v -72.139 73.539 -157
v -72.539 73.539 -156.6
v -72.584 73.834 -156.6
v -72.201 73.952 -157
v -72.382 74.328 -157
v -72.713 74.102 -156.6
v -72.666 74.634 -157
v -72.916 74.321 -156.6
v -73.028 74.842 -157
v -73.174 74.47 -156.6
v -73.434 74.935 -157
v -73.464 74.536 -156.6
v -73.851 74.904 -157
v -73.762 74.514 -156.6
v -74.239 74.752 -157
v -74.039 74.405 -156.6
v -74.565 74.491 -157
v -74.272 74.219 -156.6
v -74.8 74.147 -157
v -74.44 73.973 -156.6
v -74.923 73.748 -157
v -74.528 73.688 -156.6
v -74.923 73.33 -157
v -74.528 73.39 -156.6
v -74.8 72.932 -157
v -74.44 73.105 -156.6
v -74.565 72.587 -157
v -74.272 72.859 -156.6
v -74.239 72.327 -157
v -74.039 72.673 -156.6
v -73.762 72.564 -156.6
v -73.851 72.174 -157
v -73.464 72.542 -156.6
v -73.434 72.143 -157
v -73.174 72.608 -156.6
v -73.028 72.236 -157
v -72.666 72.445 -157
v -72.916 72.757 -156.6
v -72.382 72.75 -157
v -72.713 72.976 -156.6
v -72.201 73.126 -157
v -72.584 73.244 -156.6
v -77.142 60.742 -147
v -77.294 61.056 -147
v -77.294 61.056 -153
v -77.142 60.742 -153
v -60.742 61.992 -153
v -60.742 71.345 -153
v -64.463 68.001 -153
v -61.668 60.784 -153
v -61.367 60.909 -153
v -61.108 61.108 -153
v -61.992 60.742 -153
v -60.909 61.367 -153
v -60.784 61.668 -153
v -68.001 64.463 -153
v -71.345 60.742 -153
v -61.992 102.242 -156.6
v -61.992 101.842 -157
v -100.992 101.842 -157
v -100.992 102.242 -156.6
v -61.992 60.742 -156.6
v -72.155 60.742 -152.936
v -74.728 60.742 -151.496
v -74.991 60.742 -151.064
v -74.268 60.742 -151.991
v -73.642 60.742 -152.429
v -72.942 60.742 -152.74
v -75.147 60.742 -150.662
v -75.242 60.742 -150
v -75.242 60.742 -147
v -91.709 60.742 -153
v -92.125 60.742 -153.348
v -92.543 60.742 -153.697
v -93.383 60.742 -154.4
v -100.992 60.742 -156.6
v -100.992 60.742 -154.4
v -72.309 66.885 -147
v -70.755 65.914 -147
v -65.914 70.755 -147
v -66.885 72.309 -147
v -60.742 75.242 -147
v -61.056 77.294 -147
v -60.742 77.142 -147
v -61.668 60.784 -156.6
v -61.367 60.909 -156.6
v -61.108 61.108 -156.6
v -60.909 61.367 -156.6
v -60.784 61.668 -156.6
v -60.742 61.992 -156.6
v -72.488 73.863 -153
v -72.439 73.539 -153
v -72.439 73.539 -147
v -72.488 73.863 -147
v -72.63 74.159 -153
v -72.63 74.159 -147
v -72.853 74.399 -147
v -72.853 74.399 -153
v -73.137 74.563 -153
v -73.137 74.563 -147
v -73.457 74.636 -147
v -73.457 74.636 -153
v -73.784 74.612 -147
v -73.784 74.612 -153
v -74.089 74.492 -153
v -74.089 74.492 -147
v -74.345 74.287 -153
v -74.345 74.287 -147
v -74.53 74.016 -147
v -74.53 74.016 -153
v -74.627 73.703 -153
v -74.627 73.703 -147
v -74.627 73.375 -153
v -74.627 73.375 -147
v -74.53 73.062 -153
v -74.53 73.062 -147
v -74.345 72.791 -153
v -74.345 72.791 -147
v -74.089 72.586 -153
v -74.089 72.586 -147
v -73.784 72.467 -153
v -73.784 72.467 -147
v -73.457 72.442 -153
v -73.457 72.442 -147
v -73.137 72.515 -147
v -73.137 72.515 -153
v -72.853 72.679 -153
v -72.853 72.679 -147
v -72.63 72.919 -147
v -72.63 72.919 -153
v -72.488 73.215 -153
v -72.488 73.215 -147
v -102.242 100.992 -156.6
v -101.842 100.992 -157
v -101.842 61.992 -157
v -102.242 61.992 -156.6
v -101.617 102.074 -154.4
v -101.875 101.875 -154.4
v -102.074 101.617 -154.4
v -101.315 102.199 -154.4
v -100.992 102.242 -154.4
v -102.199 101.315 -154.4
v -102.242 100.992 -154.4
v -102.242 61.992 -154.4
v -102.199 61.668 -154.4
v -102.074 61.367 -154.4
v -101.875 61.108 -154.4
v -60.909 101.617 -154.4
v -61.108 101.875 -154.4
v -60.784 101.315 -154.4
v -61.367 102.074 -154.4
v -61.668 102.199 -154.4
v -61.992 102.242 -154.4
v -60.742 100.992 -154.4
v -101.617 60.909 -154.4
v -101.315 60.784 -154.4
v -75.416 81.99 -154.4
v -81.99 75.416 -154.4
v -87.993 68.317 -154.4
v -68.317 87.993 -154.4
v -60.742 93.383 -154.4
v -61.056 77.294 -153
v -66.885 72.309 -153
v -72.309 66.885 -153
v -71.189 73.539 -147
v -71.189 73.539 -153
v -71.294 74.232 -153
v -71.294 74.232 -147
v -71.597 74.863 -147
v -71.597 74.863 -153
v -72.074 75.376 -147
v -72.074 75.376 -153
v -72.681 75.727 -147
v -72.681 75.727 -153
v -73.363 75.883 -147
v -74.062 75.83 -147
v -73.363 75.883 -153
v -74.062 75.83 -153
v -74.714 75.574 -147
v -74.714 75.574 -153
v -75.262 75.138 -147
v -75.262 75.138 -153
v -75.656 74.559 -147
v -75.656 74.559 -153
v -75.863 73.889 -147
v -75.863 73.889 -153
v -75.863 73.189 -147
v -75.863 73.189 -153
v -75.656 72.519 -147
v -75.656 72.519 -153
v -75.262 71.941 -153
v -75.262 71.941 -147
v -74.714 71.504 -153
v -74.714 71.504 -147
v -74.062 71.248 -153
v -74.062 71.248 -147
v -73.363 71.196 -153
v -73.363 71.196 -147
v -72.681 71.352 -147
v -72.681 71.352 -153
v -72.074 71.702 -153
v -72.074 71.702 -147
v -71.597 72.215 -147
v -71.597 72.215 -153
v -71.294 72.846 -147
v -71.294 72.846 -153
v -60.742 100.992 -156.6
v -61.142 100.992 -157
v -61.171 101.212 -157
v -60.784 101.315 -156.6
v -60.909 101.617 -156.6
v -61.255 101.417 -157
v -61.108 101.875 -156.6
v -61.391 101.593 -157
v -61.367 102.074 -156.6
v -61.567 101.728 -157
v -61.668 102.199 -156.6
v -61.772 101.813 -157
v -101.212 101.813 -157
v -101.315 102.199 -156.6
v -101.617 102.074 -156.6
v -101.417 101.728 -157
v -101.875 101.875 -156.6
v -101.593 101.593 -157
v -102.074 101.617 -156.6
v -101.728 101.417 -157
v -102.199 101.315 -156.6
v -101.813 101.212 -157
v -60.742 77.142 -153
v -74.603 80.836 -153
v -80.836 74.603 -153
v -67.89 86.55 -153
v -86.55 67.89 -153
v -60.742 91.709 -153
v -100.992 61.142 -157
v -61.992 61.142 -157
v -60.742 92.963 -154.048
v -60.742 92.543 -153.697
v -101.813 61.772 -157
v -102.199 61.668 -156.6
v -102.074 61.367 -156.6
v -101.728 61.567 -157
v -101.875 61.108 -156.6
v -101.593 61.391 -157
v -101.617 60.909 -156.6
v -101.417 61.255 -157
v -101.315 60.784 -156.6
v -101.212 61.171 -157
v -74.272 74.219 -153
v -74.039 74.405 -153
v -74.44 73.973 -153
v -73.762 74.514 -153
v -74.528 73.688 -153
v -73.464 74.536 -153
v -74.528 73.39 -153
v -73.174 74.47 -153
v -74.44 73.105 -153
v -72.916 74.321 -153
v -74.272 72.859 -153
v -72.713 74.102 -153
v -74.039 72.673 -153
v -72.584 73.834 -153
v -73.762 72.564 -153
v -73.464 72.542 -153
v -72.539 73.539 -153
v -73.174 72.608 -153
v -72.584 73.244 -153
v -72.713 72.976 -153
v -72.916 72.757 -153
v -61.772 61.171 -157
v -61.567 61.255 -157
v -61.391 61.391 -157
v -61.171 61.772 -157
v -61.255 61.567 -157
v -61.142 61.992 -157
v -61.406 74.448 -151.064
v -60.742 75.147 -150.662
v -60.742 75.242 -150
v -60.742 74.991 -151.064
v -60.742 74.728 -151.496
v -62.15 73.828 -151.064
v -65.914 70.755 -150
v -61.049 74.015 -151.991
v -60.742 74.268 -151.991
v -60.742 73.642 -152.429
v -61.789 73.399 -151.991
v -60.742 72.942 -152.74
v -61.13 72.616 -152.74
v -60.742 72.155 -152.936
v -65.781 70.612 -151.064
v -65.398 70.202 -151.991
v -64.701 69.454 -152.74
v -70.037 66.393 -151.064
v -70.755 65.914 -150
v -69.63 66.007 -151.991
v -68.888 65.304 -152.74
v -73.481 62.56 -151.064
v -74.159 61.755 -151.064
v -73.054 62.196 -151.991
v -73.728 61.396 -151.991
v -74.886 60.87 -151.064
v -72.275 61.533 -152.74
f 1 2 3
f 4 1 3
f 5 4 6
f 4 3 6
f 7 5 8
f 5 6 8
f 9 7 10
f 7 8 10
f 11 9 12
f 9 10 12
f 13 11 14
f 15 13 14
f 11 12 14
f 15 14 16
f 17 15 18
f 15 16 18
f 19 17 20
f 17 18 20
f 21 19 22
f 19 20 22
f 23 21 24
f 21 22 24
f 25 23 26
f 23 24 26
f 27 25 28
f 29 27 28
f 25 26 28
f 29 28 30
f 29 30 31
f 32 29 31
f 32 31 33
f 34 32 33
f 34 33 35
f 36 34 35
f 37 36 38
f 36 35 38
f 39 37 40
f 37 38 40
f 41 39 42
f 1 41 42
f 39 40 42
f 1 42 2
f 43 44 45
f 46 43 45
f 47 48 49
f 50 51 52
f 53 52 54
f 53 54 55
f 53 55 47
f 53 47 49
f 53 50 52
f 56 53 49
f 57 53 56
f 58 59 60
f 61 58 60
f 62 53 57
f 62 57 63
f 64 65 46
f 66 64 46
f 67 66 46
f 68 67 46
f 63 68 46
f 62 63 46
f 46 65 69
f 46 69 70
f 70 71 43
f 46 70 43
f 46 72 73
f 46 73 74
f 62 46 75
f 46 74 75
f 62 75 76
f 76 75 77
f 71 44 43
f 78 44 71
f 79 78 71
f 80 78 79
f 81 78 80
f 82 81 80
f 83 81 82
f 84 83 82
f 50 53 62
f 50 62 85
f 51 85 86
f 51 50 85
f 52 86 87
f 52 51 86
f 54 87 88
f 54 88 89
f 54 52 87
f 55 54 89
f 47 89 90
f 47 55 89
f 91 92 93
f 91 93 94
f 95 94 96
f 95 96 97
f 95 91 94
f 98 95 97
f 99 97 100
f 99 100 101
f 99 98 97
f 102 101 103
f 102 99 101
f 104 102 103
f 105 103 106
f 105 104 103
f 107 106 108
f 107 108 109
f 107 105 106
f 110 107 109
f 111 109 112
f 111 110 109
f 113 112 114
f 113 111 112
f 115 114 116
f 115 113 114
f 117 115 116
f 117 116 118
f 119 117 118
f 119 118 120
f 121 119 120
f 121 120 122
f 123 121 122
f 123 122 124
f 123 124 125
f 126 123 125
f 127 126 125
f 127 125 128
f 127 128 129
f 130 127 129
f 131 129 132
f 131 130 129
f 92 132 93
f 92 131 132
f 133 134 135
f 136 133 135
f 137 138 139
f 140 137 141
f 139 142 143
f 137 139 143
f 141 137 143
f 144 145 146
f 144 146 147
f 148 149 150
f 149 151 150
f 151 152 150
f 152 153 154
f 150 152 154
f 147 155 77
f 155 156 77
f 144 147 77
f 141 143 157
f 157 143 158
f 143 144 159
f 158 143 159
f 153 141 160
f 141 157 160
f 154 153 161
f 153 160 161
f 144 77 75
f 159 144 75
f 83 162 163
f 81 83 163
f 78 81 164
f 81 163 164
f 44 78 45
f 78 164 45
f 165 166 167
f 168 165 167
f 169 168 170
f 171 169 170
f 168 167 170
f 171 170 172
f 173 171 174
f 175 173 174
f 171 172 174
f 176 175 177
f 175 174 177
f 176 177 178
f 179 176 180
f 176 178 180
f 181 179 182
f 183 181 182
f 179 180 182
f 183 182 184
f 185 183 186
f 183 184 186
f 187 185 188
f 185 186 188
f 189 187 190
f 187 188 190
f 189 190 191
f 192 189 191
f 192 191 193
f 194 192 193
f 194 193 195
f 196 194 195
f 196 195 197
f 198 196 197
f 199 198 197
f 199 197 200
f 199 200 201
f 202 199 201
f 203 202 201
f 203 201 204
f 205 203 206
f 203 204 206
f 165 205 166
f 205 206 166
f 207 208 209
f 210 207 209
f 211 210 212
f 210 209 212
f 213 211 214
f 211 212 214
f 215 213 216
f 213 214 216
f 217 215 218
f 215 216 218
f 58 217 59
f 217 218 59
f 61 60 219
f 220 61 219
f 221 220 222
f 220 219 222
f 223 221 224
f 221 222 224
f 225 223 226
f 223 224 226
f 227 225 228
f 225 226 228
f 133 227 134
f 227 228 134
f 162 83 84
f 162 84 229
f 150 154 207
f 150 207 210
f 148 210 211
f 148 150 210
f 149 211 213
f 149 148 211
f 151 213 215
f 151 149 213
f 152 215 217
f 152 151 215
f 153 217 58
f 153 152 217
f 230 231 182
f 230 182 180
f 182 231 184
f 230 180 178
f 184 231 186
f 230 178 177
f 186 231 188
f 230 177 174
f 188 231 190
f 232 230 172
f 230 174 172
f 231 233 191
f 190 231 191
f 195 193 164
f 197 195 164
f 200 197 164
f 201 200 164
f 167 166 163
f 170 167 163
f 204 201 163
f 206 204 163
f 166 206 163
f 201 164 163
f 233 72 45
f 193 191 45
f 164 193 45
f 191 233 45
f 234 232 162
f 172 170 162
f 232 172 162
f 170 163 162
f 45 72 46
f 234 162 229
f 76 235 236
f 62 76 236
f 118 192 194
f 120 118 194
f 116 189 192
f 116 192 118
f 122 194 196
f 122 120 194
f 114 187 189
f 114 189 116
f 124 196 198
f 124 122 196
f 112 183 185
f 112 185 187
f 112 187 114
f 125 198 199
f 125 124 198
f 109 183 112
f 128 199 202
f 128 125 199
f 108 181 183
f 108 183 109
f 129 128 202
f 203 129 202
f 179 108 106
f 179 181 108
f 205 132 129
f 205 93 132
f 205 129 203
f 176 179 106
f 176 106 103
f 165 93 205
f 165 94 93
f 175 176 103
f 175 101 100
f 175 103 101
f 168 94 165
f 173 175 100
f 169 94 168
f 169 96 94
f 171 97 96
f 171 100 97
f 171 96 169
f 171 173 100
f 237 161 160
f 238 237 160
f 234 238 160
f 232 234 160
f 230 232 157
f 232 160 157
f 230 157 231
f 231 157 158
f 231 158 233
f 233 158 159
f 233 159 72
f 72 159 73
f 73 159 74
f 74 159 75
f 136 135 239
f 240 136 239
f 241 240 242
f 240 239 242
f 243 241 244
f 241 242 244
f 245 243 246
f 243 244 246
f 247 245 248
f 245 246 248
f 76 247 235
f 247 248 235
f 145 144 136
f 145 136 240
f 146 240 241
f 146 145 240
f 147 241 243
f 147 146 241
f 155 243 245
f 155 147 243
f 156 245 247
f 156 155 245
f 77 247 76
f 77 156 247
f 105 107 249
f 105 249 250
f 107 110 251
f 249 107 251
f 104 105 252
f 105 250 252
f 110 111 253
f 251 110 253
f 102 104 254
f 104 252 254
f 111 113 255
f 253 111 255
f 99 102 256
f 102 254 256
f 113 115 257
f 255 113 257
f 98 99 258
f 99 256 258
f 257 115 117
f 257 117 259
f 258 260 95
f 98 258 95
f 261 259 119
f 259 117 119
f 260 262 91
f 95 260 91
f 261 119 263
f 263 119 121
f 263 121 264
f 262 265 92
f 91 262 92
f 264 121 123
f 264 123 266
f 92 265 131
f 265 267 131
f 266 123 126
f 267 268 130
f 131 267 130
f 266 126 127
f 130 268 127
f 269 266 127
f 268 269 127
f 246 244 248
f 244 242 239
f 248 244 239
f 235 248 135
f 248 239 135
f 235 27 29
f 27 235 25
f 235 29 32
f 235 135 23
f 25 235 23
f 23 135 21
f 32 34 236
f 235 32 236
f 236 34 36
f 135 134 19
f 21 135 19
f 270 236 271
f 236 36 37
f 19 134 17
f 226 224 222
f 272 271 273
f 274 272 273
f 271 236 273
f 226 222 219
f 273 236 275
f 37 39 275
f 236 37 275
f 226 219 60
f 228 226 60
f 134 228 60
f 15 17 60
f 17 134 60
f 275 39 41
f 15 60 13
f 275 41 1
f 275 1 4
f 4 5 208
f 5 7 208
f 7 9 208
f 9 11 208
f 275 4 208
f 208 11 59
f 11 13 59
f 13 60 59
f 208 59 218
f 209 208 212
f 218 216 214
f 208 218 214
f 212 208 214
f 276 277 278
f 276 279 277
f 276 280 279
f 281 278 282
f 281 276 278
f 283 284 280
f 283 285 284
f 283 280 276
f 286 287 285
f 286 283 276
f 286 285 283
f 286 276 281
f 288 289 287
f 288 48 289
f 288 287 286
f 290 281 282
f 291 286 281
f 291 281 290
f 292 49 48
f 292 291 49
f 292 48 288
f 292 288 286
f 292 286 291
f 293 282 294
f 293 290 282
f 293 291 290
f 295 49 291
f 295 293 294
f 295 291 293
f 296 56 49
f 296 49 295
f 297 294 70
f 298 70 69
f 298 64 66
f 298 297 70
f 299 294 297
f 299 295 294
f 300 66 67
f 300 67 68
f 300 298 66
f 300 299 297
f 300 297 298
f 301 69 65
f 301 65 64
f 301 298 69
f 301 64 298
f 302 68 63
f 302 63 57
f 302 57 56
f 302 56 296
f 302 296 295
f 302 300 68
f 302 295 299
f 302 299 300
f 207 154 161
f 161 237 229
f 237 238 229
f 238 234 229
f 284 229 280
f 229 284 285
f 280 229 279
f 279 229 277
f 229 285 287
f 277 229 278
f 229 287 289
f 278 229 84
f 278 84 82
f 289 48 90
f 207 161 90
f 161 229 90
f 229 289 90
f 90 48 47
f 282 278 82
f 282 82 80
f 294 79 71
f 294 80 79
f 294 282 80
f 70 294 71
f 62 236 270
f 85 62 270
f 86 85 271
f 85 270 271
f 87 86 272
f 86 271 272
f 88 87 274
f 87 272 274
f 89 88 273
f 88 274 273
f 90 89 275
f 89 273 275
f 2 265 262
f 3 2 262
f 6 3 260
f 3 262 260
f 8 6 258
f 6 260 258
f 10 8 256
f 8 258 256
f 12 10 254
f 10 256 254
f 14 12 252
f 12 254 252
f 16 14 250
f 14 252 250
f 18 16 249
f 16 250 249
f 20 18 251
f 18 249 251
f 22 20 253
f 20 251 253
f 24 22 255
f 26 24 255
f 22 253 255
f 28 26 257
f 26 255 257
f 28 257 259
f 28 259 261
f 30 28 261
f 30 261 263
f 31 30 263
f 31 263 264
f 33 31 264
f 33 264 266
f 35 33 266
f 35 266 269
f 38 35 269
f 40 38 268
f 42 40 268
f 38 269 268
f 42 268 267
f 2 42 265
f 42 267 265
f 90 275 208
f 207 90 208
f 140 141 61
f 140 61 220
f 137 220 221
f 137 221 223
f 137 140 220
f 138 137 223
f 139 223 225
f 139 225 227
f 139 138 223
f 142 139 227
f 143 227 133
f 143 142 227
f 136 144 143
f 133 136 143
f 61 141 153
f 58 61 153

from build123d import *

# Parameters (mm, degrees)
SKETCH297_R       = 1
PAD079_DEPTH      = 6
PAD079_DEPTH_BACK = 4
SKETCH298_R       = 2.35
SKETCH298_R_2     = 1.1
PAD082_DEPTH      = 6
CHAMFER003_SIZE   = 0.4


with BuildPart() as part:
    # Sketch297 → Pad079 (new body, two sides)
    with BuildSketch(Plane.XY) as pad079_sk:
        with BuildLine():
            ThreePointArc((-100.991564, 102.241564), (-101.875447, 101.875447), (-102.241564, 100.991564))
            Line((-102.241564, 61.991564), (-102.241564, 100.991564))
            ThreePointArc((-102.241564, 61.991564), (-101.875447, 61.107681), (-100.991564, 60.741564))
            Line((-61.991564, 60.741564), (-100.991564, 60.741564))
            ThreePointArc((-61.991564, 60.741564), (-61.107681, 61.107681), (-60.741564, 61.991564))
            Line((-60.741564, 100.991564), (-60.741564, 61.991564))
            ThreePointArc((-60.741564, 100.991564), (-61.107681, 101.875447), (-61.991564, 102.241564))
            Line((-100.991564, 102.241564), (-61.991564, 102.241564))
        make_face()
        with Locations((-73.539105, 73.539105)):
            Circle(SKETCH297_R, mode=Mode.SUBTRACT)
    extrude(amount=PAD079_DEPTH)
    extrude(pad079_sk.sketch, amount=-PAD079_DEPTH_BACK)

    # Sketch301 → Groove008 (revolve, cut)
    with BuildSketch(Plane.XZ):
        with BuildLine():
            Line((-96.7, 7), (0, 7))
            Line((0, 0), (0, 7))
            Line((-93.7, 0), (0, 0))
            ThreePointArc((-96.7, 3), (-95.82132, 0.87868), (-93.7, 0))
            Line((-96.7, 7), (-96.7, 3))
        make_face()
        Polygon((-165, 7), (-98.5, 7), (-98.5, 0), (-110, 0), (-111.4, -1.4), (-144.1, -1.4), (-145.5, 0), (-165, 0), align=None)
    revolve(axis=Axis((0, 0, 0), (0, 0, 1)), mode=Mode.SUBTRACT)

    # Sketch298 → Pad082 (join)
    with BuildSketch(Plane.XY):
        with Locations((-73.539105, 73.539105)):
            Circle(SKETCH298_R)
        with Locations((-73.539105, 73.539105)):
            Circle(SKETCH298_R_2, mode=Mode.SUBTRACT)
    extrude(amount=PAD082_DEPTH)

    # Chamfer003
    chamfer003_edges = [part.edges().sort_by_distance(p)[0] for p in [
        (-101.875447, 101.875447, -4),
        (-102.241564, 81.491564, -4),
        (-101.875447, 61.107681, -4),
        (-81.491564, 60.741564, -4),
        (-61.107681, 61.107681, -4),
        (-60.741564, 81.491564, -4),
        (-61.107681, 101.875447, -4),
        (-81.491564, 102.241564, -4),
        (-74.539105, 73.539105, -4),
        (-77.541682, 60.741564, 3),
        (-60.741564, 77.541682, 3),
    ]]
    chamfer(chamfer003_edges, length=CHAMFER003_SIZE)


with BuildPart() as part_1:
    # Body022063 placement: moved
    add(part.part.moved(Location((0, 0, -153))))


solid = part_1.part
